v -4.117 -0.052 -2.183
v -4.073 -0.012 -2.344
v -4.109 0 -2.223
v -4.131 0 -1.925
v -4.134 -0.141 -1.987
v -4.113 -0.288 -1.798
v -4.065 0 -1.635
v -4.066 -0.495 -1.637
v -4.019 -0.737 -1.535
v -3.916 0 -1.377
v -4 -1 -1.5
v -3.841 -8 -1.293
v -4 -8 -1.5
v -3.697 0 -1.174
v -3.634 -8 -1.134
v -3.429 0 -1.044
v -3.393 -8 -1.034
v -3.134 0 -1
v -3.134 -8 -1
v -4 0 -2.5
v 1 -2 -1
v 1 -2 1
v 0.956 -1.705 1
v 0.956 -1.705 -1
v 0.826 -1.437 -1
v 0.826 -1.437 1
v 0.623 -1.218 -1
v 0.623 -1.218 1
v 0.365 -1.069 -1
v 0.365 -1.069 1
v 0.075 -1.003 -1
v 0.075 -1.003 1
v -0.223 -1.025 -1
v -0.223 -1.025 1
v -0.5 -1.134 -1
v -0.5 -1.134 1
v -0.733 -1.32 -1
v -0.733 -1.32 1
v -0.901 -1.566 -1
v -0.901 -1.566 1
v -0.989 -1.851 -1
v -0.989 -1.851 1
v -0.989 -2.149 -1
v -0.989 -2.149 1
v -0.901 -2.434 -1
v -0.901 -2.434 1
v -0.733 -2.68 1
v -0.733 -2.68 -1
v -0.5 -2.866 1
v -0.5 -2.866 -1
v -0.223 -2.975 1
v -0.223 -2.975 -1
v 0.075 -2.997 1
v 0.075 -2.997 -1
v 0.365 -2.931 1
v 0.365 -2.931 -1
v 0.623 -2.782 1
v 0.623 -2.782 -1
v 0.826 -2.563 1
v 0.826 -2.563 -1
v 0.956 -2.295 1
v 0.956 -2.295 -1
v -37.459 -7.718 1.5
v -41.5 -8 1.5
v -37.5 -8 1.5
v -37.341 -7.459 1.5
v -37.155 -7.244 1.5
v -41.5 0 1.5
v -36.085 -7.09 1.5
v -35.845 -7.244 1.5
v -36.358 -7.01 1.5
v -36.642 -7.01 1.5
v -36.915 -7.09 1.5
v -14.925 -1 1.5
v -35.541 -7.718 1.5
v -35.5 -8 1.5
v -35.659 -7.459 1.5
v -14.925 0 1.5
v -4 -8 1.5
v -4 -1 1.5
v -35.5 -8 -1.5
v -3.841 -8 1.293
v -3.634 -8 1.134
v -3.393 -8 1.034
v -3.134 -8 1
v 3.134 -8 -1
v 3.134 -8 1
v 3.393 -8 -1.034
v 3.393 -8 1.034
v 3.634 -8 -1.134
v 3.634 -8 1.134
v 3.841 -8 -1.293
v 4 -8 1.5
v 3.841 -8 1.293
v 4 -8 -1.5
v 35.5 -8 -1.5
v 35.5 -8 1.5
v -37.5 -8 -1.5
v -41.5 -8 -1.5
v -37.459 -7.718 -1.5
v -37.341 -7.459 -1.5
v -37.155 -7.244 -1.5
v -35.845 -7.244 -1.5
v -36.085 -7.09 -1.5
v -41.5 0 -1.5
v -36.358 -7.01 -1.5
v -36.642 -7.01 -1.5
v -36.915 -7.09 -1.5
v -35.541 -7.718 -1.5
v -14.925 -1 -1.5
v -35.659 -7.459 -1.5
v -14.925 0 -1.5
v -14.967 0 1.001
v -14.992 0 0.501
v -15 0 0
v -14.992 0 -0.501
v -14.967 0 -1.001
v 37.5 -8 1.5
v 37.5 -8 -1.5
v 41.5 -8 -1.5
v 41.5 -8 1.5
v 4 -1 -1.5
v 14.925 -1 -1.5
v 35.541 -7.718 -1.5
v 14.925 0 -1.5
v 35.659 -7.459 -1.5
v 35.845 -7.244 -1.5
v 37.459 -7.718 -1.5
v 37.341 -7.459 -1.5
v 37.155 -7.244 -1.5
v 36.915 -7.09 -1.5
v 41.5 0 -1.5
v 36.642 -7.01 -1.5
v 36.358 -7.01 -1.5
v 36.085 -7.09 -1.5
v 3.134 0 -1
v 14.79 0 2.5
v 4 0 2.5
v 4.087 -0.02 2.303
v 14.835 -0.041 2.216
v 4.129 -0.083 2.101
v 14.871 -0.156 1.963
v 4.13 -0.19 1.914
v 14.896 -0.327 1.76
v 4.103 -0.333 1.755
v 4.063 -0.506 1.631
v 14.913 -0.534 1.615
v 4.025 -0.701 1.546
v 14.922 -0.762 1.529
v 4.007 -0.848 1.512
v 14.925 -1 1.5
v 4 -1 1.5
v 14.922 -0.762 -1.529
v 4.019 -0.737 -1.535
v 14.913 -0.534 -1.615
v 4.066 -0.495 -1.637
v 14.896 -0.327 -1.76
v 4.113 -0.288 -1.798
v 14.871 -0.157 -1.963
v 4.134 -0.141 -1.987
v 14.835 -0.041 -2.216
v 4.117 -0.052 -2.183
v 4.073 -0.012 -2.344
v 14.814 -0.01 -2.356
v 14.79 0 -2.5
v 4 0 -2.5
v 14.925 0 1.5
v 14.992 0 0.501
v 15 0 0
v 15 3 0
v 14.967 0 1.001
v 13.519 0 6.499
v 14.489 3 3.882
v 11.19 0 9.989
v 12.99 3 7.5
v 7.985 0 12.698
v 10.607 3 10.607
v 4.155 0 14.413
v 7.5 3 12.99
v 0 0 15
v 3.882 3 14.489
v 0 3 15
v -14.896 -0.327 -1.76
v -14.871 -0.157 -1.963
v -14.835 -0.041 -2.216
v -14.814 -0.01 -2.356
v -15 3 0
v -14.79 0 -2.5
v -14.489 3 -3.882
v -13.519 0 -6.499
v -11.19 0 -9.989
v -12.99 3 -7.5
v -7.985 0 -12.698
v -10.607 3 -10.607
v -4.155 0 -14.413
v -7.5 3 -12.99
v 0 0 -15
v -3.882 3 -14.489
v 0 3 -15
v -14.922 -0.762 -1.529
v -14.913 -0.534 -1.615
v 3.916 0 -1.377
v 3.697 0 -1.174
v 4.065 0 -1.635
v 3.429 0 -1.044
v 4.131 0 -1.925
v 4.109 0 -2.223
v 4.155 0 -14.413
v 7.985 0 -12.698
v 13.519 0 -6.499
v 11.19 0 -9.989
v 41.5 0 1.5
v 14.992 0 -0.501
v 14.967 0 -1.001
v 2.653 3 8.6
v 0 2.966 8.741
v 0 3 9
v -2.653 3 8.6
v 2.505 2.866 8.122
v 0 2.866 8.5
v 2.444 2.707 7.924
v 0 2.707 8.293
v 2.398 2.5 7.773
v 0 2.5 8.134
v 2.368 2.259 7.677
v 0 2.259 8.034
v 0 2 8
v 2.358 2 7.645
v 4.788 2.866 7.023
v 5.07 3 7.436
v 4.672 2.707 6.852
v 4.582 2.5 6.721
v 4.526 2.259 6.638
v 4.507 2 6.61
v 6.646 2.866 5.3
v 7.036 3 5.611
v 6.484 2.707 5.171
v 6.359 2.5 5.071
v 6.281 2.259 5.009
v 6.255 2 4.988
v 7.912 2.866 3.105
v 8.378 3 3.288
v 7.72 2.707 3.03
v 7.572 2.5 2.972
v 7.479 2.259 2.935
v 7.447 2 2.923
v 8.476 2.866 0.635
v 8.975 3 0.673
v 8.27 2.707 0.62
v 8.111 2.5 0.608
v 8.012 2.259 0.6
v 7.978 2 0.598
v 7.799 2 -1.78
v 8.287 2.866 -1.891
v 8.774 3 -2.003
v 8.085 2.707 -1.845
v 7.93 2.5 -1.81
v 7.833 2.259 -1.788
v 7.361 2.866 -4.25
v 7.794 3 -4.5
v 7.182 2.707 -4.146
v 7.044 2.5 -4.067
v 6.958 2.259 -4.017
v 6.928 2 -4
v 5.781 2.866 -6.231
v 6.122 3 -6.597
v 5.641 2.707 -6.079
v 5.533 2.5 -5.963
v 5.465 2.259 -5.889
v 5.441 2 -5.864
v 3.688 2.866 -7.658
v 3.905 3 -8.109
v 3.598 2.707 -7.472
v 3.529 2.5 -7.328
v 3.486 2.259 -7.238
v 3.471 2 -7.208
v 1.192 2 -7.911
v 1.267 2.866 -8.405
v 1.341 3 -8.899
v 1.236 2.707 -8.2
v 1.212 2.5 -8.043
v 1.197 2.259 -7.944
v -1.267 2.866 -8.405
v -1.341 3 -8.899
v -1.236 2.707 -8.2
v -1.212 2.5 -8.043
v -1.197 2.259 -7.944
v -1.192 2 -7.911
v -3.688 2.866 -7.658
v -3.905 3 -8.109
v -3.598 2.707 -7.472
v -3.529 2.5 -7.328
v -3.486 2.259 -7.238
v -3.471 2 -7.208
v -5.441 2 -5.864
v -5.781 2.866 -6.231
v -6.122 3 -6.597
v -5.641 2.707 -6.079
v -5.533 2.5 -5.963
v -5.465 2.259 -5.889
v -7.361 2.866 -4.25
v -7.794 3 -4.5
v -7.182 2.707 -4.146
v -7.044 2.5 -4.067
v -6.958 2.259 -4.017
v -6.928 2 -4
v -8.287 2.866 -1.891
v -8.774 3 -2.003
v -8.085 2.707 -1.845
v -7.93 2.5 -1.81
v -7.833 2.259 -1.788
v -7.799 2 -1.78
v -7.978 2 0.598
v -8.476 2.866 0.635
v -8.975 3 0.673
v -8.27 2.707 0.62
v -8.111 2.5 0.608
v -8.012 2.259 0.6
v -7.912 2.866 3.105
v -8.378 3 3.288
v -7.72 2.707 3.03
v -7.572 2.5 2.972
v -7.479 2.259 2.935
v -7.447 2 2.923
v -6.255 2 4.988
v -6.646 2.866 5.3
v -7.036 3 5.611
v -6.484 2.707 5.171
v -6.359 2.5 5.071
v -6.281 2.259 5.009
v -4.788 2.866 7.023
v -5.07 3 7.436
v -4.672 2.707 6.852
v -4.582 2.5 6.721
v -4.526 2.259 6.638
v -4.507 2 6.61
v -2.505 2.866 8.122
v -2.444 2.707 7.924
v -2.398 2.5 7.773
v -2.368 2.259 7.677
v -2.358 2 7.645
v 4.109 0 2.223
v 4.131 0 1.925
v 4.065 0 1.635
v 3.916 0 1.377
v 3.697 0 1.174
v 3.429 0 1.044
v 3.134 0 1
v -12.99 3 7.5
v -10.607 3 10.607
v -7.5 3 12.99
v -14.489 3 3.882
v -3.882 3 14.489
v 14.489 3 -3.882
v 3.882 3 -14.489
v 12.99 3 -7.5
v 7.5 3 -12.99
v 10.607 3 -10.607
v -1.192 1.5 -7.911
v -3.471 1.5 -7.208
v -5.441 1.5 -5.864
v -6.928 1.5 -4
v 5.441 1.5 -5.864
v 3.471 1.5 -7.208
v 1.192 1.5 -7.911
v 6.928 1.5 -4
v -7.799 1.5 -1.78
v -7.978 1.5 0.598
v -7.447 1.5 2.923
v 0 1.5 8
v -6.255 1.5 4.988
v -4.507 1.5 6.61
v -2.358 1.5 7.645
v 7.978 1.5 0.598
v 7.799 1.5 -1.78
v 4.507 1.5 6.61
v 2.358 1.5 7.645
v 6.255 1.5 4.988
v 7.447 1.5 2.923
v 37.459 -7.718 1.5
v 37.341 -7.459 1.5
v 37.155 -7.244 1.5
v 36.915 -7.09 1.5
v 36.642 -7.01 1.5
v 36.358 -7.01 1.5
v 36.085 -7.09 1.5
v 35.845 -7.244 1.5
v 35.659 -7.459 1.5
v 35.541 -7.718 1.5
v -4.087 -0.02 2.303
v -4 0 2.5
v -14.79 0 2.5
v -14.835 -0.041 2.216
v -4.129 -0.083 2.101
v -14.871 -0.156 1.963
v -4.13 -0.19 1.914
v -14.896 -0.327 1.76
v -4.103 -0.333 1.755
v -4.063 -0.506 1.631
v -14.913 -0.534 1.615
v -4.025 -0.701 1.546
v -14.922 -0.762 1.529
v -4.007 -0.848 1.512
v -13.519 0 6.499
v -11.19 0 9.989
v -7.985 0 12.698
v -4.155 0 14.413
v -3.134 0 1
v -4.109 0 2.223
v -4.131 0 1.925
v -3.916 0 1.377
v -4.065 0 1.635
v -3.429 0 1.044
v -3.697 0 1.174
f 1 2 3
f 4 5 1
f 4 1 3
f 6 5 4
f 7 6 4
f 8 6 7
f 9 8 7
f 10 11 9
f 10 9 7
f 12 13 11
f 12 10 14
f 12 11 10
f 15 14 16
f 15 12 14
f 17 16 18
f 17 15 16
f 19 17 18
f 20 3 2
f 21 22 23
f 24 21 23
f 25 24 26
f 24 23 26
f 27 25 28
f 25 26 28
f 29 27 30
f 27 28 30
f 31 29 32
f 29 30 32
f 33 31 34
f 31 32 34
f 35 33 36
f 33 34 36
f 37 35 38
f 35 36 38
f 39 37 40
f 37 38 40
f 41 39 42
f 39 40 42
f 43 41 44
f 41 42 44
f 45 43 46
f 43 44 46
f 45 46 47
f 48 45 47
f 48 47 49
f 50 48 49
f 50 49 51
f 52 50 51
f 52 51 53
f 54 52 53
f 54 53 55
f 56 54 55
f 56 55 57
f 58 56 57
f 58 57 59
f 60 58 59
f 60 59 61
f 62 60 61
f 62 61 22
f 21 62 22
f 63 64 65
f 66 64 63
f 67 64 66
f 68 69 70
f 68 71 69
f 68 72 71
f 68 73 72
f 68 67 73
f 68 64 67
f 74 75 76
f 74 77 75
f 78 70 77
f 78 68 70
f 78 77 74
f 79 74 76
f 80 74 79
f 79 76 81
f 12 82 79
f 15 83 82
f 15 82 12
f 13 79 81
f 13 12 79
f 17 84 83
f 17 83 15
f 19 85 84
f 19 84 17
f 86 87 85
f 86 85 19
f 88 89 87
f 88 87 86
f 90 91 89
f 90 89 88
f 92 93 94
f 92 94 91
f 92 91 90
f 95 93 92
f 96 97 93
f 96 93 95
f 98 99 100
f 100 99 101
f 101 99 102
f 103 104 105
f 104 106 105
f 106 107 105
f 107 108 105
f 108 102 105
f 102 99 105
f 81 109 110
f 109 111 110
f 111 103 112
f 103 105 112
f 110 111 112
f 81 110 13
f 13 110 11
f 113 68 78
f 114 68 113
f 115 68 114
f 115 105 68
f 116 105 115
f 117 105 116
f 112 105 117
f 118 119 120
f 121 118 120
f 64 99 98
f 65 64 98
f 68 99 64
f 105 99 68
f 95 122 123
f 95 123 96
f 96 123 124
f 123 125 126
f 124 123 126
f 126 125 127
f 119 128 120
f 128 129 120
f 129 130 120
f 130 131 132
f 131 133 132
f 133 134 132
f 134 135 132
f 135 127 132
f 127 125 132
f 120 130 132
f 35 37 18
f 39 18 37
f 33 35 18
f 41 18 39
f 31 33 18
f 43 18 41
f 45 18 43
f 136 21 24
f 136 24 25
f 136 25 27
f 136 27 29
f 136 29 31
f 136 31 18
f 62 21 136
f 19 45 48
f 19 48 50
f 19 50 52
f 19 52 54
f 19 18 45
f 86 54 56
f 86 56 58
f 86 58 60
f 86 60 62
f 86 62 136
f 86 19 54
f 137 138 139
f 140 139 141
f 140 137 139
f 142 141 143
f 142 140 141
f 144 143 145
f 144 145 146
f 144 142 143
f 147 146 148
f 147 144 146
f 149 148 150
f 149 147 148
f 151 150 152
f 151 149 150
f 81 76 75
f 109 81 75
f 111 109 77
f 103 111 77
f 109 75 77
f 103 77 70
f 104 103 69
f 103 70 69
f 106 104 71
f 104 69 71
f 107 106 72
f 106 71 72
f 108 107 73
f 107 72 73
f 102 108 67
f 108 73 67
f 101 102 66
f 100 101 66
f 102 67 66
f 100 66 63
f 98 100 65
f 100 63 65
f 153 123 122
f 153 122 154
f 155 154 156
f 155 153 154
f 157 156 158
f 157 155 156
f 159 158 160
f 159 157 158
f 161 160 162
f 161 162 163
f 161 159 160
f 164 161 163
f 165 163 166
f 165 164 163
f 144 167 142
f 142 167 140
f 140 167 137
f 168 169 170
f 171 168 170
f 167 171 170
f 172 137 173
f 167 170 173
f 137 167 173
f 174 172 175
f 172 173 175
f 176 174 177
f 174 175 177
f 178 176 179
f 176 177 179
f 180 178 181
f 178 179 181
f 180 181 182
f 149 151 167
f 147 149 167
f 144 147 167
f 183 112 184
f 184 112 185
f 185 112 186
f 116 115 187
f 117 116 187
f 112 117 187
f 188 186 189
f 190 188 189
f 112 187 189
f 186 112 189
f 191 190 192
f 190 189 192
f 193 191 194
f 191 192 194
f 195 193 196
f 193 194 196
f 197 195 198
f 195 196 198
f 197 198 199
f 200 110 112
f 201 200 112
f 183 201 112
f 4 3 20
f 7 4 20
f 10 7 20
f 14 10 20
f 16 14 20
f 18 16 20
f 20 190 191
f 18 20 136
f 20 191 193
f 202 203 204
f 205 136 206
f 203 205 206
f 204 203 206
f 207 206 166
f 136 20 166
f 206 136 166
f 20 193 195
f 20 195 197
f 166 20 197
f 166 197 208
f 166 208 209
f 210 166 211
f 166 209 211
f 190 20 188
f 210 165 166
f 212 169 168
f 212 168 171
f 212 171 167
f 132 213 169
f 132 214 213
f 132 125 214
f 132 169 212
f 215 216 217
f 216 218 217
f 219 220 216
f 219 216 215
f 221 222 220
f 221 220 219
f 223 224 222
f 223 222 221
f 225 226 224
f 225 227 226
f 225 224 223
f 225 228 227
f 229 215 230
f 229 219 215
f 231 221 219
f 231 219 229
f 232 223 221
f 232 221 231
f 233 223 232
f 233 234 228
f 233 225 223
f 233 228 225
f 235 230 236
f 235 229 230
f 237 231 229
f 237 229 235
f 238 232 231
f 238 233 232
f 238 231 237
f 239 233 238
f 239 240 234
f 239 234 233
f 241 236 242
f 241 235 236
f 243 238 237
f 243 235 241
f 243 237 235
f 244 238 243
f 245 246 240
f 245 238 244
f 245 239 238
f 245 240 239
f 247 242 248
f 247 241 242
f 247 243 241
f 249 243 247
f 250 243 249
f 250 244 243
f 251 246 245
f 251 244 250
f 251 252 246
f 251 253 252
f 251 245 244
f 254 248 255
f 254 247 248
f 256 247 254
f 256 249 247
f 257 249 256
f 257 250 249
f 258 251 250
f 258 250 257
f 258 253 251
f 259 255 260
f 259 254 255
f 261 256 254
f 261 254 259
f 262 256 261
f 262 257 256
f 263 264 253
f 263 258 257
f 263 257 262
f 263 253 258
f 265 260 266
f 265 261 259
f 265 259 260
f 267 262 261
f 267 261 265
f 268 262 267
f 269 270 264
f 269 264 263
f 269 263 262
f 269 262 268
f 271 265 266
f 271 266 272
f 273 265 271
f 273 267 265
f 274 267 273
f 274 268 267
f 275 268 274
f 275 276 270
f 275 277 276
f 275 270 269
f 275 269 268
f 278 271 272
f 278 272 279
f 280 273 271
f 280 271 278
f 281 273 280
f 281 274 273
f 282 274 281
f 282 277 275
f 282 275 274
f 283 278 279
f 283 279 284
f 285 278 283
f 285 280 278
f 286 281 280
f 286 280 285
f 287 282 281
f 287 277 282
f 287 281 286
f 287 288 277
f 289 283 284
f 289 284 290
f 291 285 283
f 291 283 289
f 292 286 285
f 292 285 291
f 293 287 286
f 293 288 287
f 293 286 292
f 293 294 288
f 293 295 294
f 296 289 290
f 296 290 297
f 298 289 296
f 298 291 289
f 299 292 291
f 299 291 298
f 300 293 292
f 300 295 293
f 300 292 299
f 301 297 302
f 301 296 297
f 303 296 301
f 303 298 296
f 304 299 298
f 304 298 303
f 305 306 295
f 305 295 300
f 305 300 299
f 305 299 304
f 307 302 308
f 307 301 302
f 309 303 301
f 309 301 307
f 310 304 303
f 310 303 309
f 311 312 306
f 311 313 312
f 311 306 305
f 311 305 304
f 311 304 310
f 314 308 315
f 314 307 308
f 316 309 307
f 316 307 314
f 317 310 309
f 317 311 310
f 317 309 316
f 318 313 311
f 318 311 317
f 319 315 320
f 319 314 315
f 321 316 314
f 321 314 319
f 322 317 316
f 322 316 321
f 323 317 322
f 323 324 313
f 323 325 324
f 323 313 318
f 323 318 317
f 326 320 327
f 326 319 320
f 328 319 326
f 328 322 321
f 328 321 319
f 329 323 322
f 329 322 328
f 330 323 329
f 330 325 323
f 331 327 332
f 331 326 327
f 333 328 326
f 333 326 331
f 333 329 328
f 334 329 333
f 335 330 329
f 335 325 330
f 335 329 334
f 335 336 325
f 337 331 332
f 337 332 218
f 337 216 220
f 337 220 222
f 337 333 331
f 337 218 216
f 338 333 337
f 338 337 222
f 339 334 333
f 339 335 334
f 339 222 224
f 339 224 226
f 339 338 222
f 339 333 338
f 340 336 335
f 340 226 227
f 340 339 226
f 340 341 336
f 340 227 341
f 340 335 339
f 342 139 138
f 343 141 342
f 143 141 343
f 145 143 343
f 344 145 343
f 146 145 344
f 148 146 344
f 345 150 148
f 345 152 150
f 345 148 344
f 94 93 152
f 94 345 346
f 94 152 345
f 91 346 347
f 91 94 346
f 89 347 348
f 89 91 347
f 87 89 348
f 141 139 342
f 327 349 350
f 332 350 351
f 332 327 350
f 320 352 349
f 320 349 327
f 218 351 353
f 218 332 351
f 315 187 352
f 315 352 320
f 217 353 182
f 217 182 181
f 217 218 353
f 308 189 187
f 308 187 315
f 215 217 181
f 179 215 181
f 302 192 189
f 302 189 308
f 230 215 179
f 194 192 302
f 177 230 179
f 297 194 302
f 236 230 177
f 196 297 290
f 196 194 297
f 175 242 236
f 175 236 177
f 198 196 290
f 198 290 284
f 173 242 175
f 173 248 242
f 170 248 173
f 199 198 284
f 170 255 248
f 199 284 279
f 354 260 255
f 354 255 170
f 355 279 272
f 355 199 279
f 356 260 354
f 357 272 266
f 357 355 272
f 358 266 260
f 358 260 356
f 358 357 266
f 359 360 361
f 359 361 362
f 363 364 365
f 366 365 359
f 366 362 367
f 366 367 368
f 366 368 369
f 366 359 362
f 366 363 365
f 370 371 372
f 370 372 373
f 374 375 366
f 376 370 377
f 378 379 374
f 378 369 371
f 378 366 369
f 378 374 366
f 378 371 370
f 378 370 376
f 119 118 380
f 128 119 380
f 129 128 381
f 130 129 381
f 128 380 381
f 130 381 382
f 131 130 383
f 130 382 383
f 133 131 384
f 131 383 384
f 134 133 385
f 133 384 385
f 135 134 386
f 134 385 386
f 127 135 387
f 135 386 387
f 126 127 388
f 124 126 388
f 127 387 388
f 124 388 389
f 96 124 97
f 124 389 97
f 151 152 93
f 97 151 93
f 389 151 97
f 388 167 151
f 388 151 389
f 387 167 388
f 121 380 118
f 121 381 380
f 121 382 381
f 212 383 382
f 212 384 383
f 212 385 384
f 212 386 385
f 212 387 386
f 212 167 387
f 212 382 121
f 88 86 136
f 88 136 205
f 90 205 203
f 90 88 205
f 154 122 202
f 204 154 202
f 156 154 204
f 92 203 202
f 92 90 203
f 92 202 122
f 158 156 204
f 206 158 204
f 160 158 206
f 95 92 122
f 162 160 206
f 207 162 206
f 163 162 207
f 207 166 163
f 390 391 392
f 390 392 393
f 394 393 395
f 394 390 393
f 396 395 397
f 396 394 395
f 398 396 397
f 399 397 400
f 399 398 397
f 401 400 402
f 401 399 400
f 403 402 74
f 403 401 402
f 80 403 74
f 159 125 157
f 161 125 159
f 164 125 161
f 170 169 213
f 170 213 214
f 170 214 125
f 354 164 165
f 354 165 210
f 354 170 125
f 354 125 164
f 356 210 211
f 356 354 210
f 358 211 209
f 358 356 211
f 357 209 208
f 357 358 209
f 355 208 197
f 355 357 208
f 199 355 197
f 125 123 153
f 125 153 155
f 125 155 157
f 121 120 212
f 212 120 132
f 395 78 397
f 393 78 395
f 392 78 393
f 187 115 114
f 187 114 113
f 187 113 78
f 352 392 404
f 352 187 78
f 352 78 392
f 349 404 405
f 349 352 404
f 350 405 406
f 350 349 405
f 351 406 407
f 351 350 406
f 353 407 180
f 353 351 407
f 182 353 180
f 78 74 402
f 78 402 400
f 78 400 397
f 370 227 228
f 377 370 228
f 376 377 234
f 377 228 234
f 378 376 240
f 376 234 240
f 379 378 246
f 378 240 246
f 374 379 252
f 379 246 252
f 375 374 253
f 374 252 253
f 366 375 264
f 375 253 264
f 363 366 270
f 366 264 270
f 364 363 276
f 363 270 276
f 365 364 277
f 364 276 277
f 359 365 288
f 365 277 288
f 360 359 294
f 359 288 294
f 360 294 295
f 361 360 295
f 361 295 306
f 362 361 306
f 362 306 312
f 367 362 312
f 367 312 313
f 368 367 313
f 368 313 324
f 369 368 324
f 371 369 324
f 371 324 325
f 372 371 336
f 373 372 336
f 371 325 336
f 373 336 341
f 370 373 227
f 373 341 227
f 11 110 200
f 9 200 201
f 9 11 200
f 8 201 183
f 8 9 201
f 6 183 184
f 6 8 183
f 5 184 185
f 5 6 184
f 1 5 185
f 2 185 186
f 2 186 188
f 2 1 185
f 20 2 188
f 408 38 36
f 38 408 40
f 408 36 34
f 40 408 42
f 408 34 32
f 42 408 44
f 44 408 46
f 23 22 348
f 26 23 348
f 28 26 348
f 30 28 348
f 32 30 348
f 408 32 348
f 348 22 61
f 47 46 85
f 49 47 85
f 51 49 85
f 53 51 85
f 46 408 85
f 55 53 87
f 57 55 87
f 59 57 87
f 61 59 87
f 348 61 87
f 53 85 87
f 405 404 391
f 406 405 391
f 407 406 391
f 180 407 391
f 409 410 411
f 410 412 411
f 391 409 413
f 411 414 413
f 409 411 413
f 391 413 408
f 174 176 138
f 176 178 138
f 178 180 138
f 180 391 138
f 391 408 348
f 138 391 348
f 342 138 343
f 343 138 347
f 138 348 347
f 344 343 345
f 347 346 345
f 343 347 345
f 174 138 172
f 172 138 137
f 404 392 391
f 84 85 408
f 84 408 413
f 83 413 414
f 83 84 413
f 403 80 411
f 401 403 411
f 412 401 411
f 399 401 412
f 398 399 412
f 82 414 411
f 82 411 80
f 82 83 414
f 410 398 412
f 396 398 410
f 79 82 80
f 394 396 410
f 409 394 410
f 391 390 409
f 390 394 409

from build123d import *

# Parameters (mm, degrees)
SKETCH1_W                = 30
SKETCH1_H                = 30
BOSS_EXTRUDE1_DEPTH      = 3
BOSS_EXTRUDE2_DEPTH      = 1.5
BOSS_EXTRUDE2_DEPTH_BACK = 1.5
SKETCH2_W                = 83
SKETCH2_H                = 8
CUT_EXTRUDE1_DEPTH       = 46.370695388
SKETCH5_R                = 8
CUT_EXTRUDE2_DEPTH       = 1.5
FILLET1_R                = 1
SKETCH6_R                = 1
CUT_EXTRUDE3_DEPTH       = 10
CUT_EXTRUDE4_REACH       = 47.478
SKETCH9_W                = 8
SKETCH9_H                = 0.5
FILLET2_R                = 1
FILLET3_R                = 1
FILLET4_R                = 15


# Some blends are built 0.0001 mm under size
with BuildPart() as part:
    # Sketch1 → Boss-Extrude1 (new body)
    with BuildSketch(Plane(origin=(0, 0, 0), x_dir=(1, 0, 0), z_dir=(0, 1, 0))):
        Rectangle(SKETCH1_W, SKETCH1_H)
    extrude(amount=BOSS_EXTRUDE1_DEPTH)

    # Sketch2 → Boss-Extrude2 (add, two sides: drawn at the far end of the back side and taken through both)
    with BuildSketch(Plane.XY.offset(-BOSS_EXTRUDE2_DEPTH_BACK)):
        with Locations((0, -4)):
            Rectangle(SKETCH2_W, SKETCH2_H)
    extrude(amount=BOSS_EXTRUDE2_DEPTH + BOSS_EXTRUDE2_DEPTH_BACK)

    # Sketch4 → Cut-Extrude1 (cut, through all)
    with BuildSketch(Plane.XY.offset(1.5)):
        with BuildLine():
            ThreePointArc((-35.5, -8), (-36.5, -7), (-37.5, -8))
            Line((-37.5, -8), (-35.5, -8))
        make_face()
        with BuildLine():
            ThreePointArc((37.5, -8), (36.5, -7), (35.5, -8))
            Line((35.5, -8), (37.5, -8))
        make_face()
    extrude(amount=-CUT_EXTRUDE1_DEPTH, mode=Mode.SUBTRACT)

    # Sketch5 → Cut-Extrude2 (cut)
    with BuildSketch(Plane(origin=(0, 3, 0), x_dir=(1, 0, 0), z_dir=(0, 1, 0))):
        with Locations(Location((0, 0, 0), (0, 0, 270))):
            Circle(SKETCH5_R)
    extrude(amount=-CUT_EXTRUDE2_DEPTH, mode=Mode.SUBTRACT)

    # Fillet1
    fillet1_edges = [part.edges().sort_by_distance(p)[0] for p in [
        (0, 3, -8),
    ]]
    fillet(fillet1_edges, radius=FILLET1_R)

    # Sketch6 → Cut-Extrude3 (cut)
    with BuildSketch(Plane.XY.offset(1.5)):
        with Locations((0, -2)):
            Circle(SKETCH6_R)
    extrude(amount=-CUT_EXTRUDE3_DEPTH, mode=Mode.SUBTRACT)

    # Cut-Extrude4: up to this face of the body (flat: up to its plane)
    cut_extrude4_end = Plane(part.part.faces().sort_by_distance((0, 0, 8.25))[0])
    # Sketch9 → Cut-Extrude4 (cut, up to the picked face)
    with BuildSketch(Plane.XZ.offset(8), mode=Mode.PRIVATE) as cut_extrude4_sk1:
        with Locations((0, -1.25)):
            Rectangle(SKETCH9_W, SKETCH9_H)
    cut_extrude4_tool1 = split(extrude(cut_extrude4_sk1.sketch, amount=-CUT_EXTRUDE4_REACH, mode=Mode.PRIVATE), bisect_by=cut_extrude4_end, keep=Keep.BOTH, mode=Mode.PRIVATE)
    # Sketch9 → Cut-Extrude4 (cut, up to the picked face)
    with BuildSketch(Plane.XZ.offset(8), mode=Mode.PRIVATE) as cut_extrude4_sk2:
        with Locations((0, 1.25)):
            Rectangle(SKETCH9_W, SKETCH9_H)
    cut_extrude4_tool2 = split(extrude(cut_extrude4_sk2.sketch, amount=-CUT_EXTRUDE4_REACH, mode=Mode.PRIVATE), bisect_by=cut_extrude4_end, keep=Keep.BOTH, mode=Mode.PRIVATE)
    add(cut_extrude4_tool1.solids().sort_by(Axis((0, -8, -1.25), (0, 1, 0)))[0], mode=Mode.SUBTRACT)
    add(cut_extrude4_tool2.solids().sort_by(Axis((0, -8, 1.25), (0, 1, 0)))[0], mode=Mode.SUBTRACT)

    # Fillet2
    # the kernel refuses this fillet: 1 mm, written as the material it adds along each edge
    with BuildSketch(Plane(origin=(-4, -8, -1), x_dir=(0, 0, -1), z_dir=(0, 1, 0))) as fillet2_piece_1_section:
        with BuildLine():
            CenterArc((1, -0.866025404), FILLET2_R, 120, 60)
            Line((0, -0.866025404), (0, 0))
            Line((0, 0), (0.5, 0))
        make_face()
    fillet2_piece_1 = extrude(amount=10.165063509, mode=Mode.PRIVATE)
    fillet2_piece_1 = split(fillet2_piece_1, bisect_by=Plane(origin=(-3.634974596, 1.5, -1.132242545), z_dir=(0, -1, 0)), keep=Keep.TOP, mode=Mode.PRIVATE)
    add(fillet2_piece_1)
    with BuildSketch(Plane(origin=(4, -8, -1), x_dir=(0, 0, -1), z_dir=(0, 1, 0))) as fillet2_piece_2_section:
        with BuildLine():
            CenterArc((1, 0.866025404), FILLET2_R, 180, 60)
            Line((0, 0.866025404), (0, 0))
            Line((0, 0), (0.5, 0))
        make_face()
    fillet2_piece_2 = extrude(amount=10.165063509, mode=Mode.PRIVATE)
    fillet2_piece_2 = split(fillet2_piece_2, bisect_by=Plane(origin=(3.634974596, 1.5, -1.132242545), z_dir=(0, -1, 0)), keep=Keep.TOP, mode=Mode.PRIVATE)
    add(fillet2_piece_2)
    with BuildSketch(Plane(origin=(-4, -8, 1), x_dir=(0, 0, 1), z_dir=(0, 1, 0))) as fillet2_piece_3_section:
        with BuildLine():
            CenterArc((1, 0.866025404), FILLET2_R, 180, 60)
            Line((0, 0.866025404), (0, 0))
            Line((0, 0), (0.5, 0))
        make_face()
    fillet2_piece_3 = extrude(amount=10.165063509, mode=Mode.PRIVATE)
    fillet2_piece_3 = split(fillet2_piece_3, bisect_by=Plane(origin=(-3.634974596, 1.5, 1.132242545), z_dir=(0, -1, 0)), keep=Keep.TOP, mode=Mode.PRIVATE)
    add(fillet2_piece_3)
    with BuildSketch(Plane(origin=(4, -8, 1), x_dir=(0, 0, 1), z_dir=(0, 1, 0))) as fillet2_piece_4_section:
        with BuildLine():
            CenterArc((1, -0.866025404), FILLET2_R, 120, 60)
            Line((0, -0.866025404), (0, 0))
            Line((0, 0), (0.5, 0))
        make_face()
    fillet2_piece_4 = extrude(amount=10.165063509, mode=Mode.PRIVATE)
    fillet2_piece_4 = split(fillet2_piece_4, bisect_by=Plane(origin=(3.634974596, 1.5, 1.132242545), z_dir=(0, -1, 0)), keep=Keep.TOP, mode=Mode.PRIVATE)
    add(fillet2_piece_4)

    # Fillet3
    fillet3_edges = [part.edges().sort_by_distance(p)[0] for p in [
        (9.5, 0, -1.5),
        (9.5, 0, 1.5),
        (-9.5, 0, 1.5),
        (-9.5, 0, -1.5),
    ]]
    fillet(fillet3_edges, radius=FILLET3_R)

    # Fillet4
    fillet4_edges = [part.edges().sort_by_distance(p)[0] for p in [
        (-15, 1.5, -15),
        (15, 1.5, -15),
        (15, 1.5, 15),
        (-15, 1.5, 15),
    ]]
    fillet(fillet4_edges, radius=FILLET4_R - 0.0001)  # a hair under: the kernel refuses the full size


solid = part.part
